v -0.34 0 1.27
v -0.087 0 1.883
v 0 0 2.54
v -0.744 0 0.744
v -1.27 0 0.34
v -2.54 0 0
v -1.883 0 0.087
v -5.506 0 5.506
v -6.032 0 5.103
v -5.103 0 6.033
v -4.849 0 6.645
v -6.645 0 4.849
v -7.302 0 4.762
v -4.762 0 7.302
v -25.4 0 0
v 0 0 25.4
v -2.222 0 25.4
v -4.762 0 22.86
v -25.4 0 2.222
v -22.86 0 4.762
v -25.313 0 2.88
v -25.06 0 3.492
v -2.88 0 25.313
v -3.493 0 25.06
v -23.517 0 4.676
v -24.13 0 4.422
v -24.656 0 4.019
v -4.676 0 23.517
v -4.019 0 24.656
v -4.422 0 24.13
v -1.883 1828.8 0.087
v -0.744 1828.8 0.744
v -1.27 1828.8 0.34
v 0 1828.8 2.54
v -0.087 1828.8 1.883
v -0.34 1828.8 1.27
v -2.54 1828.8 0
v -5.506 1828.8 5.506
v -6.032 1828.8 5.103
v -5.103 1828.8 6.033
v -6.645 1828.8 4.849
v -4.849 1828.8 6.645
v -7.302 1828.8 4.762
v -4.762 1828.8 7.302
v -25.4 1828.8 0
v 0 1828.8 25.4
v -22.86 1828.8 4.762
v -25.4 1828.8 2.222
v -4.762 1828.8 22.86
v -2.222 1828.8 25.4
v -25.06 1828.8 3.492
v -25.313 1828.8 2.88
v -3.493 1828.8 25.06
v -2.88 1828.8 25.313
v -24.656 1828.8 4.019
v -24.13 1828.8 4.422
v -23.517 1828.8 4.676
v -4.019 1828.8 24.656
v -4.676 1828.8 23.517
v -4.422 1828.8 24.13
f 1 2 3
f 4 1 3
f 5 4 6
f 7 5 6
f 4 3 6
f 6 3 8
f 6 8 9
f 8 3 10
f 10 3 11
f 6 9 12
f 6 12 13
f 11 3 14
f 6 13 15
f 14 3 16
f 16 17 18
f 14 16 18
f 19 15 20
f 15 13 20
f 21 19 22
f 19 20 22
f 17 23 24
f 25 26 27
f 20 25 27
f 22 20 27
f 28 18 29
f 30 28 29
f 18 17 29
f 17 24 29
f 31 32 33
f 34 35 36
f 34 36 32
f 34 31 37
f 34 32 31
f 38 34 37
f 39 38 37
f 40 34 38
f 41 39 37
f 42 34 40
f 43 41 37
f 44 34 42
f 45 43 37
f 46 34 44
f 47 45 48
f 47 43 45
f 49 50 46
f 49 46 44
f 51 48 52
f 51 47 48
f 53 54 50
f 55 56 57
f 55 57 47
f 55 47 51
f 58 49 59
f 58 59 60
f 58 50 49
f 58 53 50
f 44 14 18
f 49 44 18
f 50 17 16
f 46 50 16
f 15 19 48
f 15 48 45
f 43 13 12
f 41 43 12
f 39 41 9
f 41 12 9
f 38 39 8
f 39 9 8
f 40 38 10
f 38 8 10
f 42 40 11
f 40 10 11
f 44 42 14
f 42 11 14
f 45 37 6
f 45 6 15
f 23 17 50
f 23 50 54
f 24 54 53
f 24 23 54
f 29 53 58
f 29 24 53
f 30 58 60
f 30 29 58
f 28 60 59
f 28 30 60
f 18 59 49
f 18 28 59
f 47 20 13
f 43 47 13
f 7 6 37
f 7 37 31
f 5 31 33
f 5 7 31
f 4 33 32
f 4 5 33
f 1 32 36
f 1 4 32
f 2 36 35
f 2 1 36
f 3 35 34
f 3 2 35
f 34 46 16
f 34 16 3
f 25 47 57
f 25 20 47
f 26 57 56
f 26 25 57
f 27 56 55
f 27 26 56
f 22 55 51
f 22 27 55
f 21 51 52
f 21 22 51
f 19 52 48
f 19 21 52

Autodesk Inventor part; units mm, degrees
ref_plane "YZ Plane" through (0, 0, 0) normal (1, 0, 0) x (0, 1, 0)
ref_plane "XZ Plane" through (0, 0, 0) normal (0, 1, 0) x (-1, 0, 0)
ref_plane "XY Plane" through (0, 0, 0) normal (0, 0, 1) x (1, 0, 0)
sketch "Sketch1" plane through (0, 0, 0) normal (0, 1, 0) x (-1, 0, 0)
  line L0 (2.54, 0) -> (25.4, 0)
  line L1 (0, 25.4) -> (0, 2.54)
  line L2 (22.86, 4.7625) -> (7.3025, 4.7625)
  line L3 (4.7625, 7.3025) -> (4.7625, 22.86)
  line L4 (2.2225, 25.4) -> (0, 25.4)
  line L5 (25.4, 2.2225) -> (25.4, 0)
  arc A0 (4.7625, 7.3025) -> (7.3025, 4.7625) centre (7.3025, 7.3025) ccw
  arc A1 (4.7625, 22.86) -> (2.2225, 25.4) centre (2.2225, 22.86) ccw
  arc A2 (0, 2.54) -> (2.54, 0) centre (2.54, 2.54) ccw
  arc A3 (25.4, 2.2225) -> (22.86, 4.7625) centre (22.86, 2.2225) ccw
  point P0 (0, 0)
  dimension "d2" = 4.7625
  dimension "d3" = 25.4
  dimension "d4" = 25.4
  dimension "d5" = 2.54
extrude "Angle Iron Template" add sketch "Sketch1" along normal blind 1828.8
properties part number "legs-f_t"
